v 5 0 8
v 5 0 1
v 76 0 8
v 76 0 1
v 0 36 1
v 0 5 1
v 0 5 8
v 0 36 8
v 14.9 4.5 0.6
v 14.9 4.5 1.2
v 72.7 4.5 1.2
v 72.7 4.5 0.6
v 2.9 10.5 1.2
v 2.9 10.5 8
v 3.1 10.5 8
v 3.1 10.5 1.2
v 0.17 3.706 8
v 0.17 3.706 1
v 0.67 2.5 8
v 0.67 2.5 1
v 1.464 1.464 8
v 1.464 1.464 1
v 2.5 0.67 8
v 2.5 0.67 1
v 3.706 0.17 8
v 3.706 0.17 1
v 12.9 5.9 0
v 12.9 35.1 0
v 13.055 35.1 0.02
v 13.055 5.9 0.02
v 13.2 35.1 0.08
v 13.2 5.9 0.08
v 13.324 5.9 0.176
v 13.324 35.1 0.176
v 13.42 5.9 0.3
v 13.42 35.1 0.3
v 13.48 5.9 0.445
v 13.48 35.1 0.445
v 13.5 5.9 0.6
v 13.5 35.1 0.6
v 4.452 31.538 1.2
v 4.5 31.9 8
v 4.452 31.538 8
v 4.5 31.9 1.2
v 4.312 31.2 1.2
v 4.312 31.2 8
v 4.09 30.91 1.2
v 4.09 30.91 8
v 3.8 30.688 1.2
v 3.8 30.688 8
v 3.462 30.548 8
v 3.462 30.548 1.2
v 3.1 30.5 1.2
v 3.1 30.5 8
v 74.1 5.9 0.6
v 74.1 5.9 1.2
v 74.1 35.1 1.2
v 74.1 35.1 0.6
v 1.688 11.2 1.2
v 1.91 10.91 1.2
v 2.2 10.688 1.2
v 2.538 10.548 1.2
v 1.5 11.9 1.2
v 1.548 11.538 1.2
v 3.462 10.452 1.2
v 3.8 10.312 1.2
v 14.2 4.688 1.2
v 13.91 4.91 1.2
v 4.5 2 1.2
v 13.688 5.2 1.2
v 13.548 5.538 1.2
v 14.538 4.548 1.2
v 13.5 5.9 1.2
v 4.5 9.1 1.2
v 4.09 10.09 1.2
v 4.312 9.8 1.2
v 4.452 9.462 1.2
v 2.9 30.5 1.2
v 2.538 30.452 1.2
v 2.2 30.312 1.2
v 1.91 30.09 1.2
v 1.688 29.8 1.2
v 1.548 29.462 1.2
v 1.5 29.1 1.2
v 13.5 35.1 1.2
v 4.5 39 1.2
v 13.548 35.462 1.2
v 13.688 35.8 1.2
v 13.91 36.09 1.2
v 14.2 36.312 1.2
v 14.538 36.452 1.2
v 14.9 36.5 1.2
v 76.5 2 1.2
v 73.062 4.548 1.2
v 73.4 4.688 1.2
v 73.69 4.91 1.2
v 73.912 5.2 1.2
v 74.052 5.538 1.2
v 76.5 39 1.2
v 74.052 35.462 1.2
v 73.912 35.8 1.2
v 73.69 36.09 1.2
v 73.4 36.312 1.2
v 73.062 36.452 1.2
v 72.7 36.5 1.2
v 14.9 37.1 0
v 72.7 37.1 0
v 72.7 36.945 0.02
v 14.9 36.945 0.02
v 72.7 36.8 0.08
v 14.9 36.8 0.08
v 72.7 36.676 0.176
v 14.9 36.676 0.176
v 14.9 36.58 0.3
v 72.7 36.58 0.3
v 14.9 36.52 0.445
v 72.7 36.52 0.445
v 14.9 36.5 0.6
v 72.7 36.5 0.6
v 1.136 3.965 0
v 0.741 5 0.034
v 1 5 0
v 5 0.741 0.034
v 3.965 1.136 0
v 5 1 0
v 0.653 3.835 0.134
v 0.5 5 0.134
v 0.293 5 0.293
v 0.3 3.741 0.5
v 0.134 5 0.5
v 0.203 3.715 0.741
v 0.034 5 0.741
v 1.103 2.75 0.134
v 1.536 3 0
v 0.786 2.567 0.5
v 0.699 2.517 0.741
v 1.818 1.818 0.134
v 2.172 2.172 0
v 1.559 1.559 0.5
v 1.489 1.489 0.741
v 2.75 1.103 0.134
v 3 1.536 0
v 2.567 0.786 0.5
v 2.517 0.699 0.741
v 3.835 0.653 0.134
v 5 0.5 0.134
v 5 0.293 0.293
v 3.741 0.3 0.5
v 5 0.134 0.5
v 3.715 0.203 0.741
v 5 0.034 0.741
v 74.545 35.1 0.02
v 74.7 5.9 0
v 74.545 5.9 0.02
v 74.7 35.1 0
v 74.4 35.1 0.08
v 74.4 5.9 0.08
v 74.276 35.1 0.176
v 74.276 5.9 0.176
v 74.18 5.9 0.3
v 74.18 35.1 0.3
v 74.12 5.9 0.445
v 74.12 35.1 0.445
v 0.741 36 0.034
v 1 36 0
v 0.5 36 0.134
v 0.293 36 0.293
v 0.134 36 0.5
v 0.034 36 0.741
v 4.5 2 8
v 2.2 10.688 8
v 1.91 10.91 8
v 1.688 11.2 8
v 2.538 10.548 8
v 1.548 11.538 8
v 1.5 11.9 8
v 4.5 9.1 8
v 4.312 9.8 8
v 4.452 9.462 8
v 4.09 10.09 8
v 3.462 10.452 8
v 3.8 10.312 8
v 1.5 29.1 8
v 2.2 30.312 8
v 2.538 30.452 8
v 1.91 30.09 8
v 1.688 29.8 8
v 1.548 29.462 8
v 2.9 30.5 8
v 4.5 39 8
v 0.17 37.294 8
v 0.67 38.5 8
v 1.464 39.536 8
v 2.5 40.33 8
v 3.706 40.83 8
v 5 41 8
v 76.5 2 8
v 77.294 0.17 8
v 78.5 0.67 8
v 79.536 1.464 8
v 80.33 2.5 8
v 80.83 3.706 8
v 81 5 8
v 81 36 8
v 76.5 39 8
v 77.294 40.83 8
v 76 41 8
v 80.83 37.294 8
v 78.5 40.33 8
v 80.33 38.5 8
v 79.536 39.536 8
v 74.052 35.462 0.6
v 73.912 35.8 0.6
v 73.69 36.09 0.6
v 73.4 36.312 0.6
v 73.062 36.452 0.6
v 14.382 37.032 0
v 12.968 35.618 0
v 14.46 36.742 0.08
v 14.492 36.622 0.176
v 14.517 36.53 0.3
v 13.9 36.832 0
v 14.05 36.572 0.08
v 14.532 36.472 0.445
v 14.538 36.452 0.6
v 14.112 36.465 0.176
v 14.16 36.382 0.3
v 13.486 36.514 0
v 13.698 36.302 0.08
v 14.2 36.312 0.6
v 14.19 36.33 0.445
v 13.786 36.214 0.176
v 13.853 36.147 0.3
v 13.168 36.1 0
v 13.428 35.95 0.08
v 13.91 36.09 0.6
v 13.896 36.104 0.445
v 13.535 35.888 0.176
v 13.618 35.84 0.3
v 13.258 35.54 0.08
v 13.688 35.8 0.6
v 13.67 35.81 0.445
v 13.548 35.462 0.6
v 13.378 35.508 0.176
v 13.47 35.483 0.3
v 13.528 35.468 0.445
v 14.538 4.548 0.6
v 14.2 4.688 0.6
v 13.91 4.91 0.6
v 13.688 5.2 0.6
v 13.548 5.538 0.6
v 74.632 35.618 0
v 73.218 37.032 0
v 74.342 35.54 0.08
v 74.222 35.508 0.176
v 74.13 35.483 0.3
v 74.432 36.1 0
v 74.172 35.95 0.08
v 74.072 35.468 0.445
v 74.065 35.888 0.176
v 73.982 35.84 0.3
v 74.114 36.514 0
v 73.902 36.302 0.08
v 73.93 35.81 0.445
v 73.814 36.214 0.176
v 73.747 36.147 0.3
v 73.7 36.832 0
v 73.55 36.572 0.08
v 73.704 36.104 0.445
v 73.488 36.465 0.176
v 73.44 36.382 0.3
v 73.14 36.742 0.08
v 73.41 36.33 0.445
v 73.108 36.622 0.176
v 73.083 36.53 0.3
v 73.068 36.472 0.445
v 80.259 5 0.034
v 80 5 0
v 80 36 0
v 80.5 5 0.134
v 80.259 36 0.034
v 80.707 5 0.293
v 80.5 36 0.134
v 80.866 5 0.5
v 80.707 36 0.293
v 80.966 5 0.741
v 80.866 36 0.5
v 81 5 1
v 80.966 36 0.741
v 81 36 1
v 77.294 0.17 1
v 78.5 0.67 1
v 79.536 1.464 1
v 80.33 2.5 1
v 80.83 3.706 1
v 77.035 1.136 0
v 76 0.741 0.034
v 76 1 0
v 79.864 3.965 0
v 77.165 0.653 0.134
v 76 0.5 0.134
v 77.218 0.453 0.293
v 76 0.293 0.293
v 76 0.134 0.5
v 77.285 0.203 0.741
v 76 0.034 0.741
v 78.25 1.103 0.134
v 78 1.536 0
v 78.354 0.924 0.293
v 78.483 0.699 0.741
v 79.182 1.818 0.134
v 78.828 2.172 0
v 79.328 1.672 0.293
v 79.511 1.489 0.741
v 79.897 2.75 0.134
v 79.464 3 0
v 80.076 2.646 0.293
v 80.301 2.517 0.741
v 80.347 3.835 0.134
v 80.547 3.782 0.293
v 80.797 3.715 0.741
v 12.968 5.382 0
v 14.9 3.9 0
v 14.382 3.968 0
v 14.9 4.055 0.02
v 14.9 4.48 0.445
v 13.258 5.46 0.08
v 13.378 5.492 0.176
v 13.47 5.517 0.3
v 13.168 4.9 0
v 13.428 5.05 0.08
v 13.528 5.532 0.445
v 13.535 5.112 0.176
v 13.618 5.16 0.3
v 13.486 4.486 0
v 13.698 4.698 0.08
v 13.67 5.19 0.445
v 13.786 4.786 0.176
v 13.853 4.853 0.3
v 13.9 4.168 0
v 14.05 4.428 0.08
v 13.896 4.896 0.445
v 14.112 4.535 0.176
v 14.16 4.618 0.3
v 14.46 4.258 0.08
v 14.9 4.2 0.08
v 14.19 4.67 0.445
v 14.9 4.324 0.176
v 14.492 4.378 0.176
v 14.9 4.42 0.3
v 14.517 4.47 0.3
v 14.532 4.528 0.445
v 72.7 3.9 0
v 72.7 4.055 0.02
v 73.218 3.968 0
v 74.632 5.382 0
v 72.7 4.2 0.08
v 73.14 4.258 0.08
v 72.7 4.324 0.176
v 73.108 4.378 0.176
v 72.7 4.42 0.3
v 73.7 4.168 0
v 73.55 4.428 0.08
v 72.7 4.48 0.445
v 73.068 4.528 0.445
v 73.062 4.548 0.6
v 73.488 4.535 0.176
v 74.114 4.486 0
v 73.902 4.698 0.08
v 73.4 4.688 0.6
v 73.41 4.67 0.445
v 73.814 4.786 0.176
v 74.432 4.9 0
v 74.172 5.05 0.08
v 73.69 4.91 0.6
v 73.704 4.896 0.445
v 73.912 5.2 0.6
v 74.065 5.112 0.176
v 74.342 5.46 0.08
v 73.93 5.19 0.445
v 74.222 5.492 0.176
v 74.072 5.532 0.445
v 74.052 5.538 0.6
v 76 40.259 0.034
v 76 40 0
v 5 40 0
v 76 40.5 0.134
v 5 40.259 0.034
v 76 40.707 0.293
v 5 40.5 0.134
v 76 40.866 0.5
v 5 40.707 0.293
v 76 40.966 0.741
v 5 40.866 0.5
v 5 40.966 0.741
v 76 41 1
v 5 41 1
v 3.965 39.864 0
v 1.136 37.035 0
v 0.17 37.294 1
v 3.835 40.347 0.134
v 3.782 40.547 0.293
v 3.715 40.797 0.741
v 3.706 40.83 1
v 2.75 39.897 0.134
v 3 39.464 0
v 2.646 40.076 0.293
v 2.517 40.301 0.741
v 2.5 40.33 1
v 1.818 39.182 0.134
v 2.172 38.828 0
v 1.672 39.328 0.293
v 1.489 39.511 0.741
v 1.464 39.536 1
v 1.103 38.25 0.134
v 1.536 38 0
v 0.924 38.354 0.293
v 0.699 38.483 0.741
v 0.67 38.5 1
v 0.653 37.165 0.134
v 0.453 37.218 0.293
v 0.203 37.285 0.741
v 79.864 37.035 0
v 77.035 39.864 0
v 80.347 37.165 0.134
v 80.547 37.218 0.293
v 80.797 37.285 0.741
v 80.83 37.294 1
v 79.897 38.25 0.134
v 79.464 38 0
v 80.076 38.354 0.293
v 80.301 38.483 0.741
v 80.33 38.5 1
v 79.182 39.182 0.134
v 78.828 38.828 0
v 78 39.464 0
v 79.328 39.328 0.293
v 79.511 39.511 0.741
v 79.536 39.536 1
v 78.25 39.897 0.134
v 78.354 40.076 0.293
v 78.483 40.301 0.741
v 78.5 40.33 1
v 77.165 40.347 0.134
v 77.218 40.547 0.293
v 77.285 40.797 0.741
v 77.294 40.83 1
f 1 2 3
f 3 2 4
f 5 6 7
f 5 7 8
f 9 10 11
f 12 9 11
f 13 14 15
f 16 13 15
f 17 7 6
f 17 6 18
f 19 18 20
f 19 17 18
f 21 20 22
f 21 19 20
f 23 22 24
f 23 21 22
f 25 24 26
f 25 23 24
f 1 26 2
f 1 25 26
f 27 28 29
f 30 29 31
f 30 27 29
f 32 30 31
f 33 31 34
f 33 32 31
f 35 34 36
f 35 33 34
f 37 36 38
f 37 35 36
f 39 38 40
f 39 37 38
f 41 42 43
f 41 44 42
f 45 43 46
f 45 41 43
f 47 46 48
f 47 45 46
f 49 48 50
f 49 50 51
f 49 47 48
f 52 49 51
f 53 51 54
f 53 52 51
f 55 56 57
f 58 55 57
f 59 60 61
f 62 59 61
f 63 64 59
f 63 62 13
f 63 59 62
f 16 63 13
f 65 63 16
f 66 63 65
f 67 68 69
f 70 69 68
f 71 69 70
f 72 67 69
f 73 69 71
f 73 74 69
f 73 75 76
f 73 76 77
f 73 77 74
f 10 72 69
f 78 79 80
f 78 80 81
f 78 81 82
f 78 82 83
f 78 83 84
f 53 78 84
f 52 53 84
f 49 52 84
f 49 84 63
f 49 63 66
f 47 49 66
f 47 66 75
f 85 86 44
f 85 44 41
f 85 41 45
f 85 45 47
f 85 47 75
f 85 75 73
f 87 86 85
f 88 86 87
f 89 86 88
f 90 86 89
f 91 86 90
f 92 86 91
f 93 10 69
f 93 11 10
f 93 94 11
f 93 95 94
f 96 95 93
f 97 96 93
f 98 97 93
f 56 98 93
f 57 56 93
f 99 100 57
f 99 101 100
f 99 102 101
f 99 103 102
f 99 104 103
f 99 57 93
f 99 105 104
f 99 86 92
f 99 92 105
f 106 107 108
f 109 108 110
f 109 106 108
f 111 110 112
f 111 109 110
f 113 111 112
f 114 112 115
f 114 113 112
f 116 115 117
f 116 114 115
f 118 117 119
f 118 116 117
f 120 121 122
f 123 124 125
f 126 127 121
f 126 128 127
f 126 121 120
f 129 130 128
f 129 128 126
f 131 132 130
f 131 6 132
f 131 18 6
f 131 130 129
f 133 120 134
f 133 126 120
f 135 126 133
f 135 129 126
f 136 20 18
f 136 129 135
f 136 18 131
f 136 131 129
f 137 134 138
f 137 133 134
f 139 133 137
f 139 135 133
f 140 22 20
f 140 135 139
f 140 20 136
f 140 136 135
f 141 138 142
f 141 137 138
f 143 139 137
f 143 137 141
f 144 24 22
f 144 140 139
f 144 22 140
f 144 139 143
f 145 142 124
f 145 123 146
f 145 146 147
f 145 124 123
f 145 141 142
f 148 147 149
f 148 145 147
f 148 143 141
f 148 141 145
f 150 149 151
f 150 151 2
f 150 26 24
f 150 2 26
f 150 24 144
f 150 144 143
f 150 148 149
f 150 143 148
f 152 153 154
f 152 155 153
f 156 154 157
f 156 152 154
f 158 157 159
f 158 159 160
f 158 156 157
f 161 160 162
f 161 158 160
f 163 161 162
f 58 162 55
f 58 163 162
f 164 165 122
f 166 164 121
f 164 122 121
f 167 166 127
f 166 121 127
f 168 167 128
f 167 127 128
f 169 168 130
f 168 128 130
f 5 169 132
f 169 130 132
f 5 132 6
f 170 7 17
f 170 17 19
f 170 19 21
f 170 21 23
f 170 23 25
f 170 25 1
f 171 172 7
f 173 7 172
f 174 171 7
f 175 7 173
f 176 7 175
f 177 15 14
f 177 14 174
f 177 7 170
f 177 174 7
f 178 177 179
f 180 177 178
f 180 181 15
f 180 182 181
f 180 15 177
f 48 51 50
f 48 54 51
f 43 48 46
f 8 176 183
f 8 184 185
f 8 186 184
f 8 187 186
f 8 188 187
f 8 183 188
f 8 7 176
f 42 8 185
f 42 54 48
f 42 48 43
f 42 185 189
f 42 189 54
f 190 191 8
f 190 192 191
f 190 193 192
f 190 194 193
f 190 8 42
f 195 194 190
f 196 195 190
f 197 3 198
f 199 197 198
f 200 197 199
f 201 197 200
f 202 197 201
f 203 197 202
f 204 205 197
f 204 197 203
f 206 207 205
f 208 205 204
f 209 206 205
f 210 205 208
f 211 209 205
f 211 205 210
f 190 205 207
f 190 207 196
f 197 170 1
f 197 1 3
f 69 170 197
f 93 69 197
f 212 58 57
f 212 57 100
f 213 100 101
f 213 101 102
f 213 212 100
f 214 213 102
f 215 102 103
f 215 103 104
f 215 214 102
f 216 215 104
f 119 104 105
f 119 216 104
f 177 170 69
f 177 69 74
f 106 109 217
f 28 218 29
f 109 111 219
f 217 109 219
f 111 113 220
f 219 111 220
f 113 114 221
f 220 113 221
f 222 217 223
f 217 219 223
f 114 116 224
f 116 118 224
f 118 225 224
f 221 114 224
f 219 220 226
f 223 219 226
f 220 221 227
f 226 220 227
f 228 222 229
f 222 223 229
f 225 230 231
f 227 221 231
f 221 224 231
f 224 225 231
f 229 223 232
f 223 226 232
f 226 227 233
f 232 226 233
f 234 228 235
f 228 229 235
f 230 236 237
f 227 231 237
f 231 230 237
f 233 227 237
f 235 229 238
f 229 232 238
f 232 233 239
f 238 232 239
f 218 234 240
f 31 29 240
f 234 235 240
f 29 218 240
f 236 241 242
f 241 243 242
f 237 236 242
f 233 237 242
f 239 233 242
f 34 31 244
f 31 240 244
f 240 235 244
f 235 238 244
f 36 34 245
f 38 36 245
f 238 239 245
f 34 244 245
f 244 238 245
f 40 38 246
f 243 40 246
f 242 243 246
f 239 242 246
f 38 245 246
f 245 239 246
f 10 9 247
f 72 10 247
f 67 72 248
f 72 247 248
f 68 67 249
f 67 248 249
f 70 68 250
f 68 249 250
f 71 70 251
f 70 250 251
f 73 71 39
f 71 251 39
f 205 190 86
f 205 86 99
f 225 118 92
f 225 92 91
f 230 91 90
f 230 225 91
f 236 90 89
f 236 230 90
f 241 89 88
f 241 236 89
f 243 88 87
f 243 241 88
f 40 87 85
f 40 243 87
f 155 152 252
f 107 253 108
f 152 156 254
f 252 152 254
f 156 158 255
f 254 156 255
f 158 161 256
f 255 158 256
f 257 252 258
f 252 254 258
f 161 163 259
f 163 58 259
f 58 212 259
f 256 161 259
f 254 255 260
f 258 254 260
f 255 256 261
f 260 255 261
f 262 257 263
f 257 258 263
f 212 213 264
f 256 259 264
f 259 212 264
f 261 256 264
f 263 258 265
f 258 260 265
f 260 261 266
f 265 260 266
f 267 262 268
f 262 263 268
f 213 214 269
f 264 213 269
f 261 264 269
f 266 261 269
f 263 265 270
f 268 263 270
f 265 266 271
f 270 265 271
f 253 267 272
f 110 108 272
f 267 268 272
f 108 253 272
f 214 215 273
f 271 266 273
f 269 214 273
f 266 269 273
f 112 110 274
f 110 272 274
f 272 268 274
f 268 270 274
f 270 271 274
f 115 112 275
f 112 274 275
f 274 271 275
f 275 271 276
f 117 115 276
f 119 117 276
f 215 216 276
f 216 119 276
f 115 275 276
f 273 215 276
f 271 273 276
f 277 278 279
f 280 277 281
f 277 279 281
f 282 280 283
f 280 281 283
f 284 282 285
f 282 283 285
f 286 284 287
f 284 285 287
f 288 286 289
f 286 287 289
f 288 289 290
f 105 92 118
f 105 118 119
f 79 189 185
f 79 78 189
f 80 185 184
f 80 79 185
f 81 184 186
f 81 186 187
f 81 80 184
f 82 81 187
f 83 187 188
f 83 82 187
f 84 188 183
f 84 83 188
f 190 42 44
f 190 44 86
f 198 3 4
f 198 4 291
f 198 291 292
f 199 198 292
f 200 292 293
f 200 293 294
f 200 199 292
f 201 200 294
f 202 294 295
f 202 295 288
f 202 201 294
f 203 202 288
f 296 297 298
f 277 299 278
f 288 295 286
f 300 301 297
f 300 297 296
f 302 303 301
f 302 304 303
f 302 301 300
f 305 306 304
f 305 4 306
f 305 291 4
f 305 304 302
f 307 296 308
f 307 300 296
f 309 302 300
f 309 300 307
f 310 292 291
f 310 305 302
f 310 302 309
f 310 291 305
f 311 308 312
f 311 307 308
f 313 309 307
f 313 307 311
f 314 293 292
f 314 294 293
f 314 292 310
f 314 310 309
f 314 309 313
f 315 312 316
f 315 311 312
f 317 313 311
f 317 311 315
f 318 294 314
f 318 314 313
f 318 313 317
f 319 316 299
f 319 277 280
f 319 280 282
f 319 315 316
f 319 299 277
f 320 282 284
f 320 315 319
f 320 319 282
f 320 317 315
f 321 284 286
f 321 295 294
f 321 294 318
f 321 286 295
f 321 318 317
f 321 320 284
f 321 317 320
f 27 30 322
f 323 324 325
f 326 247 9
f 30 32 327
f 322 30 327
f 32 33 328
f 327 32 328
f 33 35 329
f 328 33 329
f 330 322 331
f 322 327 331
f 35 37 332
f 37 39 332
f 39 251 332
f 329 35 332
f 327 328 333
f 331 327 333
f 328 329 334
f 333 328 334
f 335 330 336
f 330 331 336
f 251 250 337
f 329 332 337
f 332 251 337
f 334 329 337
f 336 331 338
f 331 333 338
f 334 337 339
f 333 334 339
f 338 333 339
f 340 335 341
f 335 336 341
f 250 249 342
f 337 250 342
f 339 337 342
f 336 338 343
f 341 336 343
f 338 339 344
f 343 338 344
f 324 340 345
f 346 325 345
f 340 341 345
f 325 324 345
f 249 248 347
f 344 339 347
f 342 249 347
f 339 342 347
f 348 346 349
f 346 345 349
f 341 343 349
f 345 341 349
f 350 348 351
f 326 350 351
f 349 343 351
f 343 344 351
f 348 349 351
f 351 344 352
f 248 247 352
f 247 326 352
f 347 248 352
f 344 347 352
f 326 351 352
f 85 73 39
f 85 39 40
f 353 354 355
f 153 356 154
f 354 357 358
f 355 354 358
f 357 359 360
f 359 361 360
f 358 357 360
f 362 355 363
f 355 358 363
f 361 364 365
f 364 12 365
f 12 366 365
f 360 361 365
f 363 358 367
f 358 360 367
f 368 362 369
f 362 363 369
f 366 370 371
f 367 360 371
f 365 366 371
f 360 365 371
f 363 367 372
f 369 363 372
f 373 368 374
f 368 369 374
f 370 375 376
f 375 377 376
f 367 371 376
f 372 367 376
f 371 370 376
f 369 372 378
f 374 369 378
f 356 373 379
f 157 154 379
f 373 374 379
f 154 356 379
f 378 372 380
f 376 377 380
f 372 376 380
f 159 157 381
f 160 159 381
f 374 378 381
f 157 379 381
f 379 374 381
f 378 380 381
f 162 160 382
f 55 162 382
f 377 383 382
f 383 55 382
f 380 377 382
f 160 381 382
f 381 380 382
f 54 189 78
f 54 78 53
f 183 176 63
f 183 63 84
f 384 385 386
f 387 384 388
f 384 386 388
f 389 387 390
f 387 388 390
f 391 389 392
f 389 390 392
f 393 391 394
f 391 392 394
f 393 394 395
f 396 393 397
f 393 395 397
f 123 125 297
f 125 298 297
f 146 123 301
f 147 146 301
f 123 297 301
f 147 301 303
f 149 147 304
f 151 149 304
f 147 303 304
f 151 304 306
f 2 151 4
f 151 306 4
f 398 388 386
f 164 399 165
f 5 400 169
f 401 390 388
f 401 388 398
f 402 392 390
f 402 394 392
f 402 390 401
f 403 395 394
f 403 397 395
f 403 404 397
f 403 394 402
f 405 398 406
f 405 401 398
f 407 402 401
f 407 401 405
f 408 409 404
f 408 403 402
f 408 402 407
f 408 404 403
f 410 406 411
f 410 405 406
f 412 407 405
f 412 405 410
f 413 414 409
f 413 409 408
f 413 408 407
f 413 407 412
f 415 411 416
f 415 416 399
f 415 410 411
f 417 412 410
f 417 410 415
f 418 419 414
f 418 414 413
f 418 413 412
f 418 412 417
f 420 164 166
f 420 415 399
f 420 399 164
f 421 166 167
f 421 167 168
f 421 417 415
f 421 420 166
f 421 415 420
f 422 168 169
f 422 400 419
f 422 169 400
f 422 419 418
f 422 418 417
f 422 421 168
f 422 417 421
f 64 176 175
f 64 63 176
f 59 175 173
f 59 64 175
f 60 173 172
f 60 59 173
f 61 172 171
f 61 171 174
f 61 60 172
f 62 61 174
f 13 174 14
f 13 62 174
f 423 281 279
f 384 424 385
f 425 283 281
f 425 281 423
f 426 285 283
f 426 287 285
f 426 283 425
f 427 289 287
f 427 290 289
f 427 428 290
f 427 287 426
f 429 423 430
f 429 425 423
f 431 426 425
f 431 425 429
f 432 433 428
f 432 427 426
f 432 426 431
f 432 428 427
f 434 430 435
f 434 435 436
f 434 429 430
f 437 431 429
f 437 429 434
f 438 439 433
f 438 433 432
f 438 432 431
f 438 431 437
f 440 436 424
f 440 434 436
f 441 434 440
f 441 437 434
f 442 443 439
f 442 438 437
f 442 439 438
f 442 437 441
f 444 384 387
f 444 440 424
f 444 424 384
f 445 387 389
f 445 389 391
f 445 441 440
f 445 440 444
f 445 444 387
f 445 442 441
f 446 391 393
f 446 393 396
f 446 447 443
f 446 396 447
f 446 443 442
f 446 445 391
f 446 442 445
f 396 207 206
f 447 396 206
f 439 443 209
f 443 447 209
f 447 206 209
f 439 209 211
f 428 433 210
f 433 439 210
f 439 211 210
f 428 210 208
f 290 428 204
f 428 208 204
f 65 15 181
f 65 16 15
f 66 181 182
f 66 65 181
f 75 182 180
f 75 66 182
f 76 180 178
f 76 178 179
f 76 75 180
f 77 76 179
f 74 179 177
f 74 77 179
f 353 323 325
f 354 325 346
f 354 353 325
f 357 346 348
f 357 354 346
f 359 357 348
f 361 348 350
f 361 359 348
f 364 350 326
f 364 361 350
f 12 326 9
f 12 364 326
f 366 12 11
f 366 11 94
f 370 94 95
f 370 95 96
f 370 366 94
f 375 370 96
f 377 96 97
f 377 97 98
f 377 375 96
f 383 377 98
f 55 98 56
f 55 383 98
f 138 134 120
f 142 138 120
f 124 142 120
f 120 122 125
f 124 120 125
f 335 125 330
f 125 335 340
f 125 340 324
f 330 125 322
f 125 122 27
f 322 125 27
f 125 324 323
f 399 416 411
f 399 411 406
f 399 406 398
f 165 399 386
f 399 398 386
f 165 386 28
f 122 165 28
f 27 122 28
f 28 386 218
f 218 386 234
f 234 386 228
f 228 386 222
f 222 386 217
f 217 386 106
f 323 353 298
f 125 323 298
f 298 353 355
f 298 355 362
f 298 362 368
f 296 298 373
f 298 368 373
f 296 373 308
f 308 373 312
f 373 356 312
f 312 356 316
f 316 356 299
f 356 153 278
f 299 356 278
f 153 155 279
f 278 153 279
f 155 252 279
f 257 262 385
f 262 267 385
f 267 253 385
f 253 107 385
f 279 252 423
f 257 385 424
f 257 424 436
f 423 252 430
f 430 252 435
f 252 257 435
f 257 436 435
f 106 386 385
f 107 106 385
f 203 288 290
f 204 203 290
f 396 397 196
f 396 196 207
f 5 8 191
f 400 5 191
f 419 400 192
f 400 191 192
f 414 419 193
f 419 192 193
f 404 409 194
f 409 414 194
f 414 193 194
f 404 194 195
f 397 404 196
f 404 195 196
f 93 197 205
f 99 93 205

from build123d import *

# Parameters (mm, degrees)
SKETCH1_W           = 81
SKETCH1_H           = 41
BOSS_EXTRUDE1_DEPTH = 8
SKETCH2_W           = 72
SKETCH2_H           = 37
CUT_EXTRUDE1_DEPTH  = 6.8
SKETCH3_W           = 3
SKETCH3_H           = 20
CUT_EXTRUDE2_DEPTH  = 6.8
SKETCH4_W           = 60.6
SKETCH4_H           = 32
CUT_EXTRUDE3_DEPTH  = 6.4
FILLET1_R           = 1.4
FILLET2_R           = 5
FILLET3_R           = 0.6
FILLET4_R           = 1


with BuildPart() as part:
    # Sketch1 → Boss-Extrude1 (new body)
    with BuildSketch(Plane.XY):
        with Locations((40.5, 20.5)):
            Rectangle(SKETCH1_W, SKETCH1_H)
    extrude(amount=BOSS_EXTRUDE1_DEPTH)

    # Sketch2 → Cut-Extrude1 (cut)
    with BuildSketch(Plane.XY.offset(8)):
        with Locations((40.5, 20.5)):
            Rectangle(SKETCH2_W, SKETCH2_H)
    extrude(amount=-CUT_EXTRUDE1_DEPTH, mode=Mode.SUBTRACT)

    # Sketch3 → Cut-Extrude2 (cut)
    with BuildSketch(Plane.XY.offset(8)):
        with Locations((3, 20.5)):
            Rectangle(SKETCH3_W, SKETCH3_H)
    extrude(amount=-CUT_EXTRUDE2_DEPTH, mode=Mode.SUBTRACT)

    # Sketch4 → Cut-Extrude3 (cut)
    with BuildSketch(Plane.XY.offset(1.2)):
        with Locations((43.8, 20.5)):
            Rectangle(SKETCH4_W, SKETCH4_H)
    extrude(amount=-CUT_EXTRUDE3_DEPTH, mode=Mode.SUBTRACT)

    # Fillet1
    fillet1_edges = [part.edges().sort_by_distance(p)[0] for p in [
        (4.5, 30.5, 4.6),
        (4.5, 10.5, 4.6),
        (1.5, 10.5, 4.6),
        (1.5, 30.5, 4.6),
        (13.5, 4.5, 0.6),
        (13.5, 36.5, 0.6),
        (74.1, 36.5, 0.6),
        (74.1, 4.5, 0.6),
    ]]
    fillet(fillet1_edges, radius=FILLET1_R)

    # Fillet2
    fillet2_edges = [part.edges().sort_by_distance(p)[0] for p in [
        (0, 41, 4),
        (81, 41, 4),
        (81, 0, 4),
        (0, 0, 4),
    ]]
    fillet(fillet2_edges, radius=FILLET2_R)

    # Fillet3
    fillet3_edges = [part.edges().sort_by_distance(p)[0] for p in [
        (74.1, 20.5, 0),
        (43.8, 4.5, 0),
        (13.5, 20.5, 0),
        (43.8, 36.5, 0),
        (73.689949494, 4.910050506, 0),
        (13.910050506, 4.910050506, 0),
        (13.910050506, 36.089949494, 0),
        (73.689949494, 36.089949494, 0),
    ]]
    fillet(fillet3_edges, radius=FILLET3_R)

    # Fillet4
    fillet4_edges = [part.edges().sort_by_distance(p)[0] for p in [
        (40.5, 0, 0),
        (0, 20.5, 0),
        (40.5, 41, 0),
        (81, 20.5, 0),
        (1.464466094, 39.535533906, 0),
        (79.535533906, 39.535533906, 0),
        (79.535533906, 1.464466094, 0),
        (1.464466094, 1.464466094, 0),
    ]]
    fillet(fillet4_edges, radius=FILLET4_R)


solid = part.part
